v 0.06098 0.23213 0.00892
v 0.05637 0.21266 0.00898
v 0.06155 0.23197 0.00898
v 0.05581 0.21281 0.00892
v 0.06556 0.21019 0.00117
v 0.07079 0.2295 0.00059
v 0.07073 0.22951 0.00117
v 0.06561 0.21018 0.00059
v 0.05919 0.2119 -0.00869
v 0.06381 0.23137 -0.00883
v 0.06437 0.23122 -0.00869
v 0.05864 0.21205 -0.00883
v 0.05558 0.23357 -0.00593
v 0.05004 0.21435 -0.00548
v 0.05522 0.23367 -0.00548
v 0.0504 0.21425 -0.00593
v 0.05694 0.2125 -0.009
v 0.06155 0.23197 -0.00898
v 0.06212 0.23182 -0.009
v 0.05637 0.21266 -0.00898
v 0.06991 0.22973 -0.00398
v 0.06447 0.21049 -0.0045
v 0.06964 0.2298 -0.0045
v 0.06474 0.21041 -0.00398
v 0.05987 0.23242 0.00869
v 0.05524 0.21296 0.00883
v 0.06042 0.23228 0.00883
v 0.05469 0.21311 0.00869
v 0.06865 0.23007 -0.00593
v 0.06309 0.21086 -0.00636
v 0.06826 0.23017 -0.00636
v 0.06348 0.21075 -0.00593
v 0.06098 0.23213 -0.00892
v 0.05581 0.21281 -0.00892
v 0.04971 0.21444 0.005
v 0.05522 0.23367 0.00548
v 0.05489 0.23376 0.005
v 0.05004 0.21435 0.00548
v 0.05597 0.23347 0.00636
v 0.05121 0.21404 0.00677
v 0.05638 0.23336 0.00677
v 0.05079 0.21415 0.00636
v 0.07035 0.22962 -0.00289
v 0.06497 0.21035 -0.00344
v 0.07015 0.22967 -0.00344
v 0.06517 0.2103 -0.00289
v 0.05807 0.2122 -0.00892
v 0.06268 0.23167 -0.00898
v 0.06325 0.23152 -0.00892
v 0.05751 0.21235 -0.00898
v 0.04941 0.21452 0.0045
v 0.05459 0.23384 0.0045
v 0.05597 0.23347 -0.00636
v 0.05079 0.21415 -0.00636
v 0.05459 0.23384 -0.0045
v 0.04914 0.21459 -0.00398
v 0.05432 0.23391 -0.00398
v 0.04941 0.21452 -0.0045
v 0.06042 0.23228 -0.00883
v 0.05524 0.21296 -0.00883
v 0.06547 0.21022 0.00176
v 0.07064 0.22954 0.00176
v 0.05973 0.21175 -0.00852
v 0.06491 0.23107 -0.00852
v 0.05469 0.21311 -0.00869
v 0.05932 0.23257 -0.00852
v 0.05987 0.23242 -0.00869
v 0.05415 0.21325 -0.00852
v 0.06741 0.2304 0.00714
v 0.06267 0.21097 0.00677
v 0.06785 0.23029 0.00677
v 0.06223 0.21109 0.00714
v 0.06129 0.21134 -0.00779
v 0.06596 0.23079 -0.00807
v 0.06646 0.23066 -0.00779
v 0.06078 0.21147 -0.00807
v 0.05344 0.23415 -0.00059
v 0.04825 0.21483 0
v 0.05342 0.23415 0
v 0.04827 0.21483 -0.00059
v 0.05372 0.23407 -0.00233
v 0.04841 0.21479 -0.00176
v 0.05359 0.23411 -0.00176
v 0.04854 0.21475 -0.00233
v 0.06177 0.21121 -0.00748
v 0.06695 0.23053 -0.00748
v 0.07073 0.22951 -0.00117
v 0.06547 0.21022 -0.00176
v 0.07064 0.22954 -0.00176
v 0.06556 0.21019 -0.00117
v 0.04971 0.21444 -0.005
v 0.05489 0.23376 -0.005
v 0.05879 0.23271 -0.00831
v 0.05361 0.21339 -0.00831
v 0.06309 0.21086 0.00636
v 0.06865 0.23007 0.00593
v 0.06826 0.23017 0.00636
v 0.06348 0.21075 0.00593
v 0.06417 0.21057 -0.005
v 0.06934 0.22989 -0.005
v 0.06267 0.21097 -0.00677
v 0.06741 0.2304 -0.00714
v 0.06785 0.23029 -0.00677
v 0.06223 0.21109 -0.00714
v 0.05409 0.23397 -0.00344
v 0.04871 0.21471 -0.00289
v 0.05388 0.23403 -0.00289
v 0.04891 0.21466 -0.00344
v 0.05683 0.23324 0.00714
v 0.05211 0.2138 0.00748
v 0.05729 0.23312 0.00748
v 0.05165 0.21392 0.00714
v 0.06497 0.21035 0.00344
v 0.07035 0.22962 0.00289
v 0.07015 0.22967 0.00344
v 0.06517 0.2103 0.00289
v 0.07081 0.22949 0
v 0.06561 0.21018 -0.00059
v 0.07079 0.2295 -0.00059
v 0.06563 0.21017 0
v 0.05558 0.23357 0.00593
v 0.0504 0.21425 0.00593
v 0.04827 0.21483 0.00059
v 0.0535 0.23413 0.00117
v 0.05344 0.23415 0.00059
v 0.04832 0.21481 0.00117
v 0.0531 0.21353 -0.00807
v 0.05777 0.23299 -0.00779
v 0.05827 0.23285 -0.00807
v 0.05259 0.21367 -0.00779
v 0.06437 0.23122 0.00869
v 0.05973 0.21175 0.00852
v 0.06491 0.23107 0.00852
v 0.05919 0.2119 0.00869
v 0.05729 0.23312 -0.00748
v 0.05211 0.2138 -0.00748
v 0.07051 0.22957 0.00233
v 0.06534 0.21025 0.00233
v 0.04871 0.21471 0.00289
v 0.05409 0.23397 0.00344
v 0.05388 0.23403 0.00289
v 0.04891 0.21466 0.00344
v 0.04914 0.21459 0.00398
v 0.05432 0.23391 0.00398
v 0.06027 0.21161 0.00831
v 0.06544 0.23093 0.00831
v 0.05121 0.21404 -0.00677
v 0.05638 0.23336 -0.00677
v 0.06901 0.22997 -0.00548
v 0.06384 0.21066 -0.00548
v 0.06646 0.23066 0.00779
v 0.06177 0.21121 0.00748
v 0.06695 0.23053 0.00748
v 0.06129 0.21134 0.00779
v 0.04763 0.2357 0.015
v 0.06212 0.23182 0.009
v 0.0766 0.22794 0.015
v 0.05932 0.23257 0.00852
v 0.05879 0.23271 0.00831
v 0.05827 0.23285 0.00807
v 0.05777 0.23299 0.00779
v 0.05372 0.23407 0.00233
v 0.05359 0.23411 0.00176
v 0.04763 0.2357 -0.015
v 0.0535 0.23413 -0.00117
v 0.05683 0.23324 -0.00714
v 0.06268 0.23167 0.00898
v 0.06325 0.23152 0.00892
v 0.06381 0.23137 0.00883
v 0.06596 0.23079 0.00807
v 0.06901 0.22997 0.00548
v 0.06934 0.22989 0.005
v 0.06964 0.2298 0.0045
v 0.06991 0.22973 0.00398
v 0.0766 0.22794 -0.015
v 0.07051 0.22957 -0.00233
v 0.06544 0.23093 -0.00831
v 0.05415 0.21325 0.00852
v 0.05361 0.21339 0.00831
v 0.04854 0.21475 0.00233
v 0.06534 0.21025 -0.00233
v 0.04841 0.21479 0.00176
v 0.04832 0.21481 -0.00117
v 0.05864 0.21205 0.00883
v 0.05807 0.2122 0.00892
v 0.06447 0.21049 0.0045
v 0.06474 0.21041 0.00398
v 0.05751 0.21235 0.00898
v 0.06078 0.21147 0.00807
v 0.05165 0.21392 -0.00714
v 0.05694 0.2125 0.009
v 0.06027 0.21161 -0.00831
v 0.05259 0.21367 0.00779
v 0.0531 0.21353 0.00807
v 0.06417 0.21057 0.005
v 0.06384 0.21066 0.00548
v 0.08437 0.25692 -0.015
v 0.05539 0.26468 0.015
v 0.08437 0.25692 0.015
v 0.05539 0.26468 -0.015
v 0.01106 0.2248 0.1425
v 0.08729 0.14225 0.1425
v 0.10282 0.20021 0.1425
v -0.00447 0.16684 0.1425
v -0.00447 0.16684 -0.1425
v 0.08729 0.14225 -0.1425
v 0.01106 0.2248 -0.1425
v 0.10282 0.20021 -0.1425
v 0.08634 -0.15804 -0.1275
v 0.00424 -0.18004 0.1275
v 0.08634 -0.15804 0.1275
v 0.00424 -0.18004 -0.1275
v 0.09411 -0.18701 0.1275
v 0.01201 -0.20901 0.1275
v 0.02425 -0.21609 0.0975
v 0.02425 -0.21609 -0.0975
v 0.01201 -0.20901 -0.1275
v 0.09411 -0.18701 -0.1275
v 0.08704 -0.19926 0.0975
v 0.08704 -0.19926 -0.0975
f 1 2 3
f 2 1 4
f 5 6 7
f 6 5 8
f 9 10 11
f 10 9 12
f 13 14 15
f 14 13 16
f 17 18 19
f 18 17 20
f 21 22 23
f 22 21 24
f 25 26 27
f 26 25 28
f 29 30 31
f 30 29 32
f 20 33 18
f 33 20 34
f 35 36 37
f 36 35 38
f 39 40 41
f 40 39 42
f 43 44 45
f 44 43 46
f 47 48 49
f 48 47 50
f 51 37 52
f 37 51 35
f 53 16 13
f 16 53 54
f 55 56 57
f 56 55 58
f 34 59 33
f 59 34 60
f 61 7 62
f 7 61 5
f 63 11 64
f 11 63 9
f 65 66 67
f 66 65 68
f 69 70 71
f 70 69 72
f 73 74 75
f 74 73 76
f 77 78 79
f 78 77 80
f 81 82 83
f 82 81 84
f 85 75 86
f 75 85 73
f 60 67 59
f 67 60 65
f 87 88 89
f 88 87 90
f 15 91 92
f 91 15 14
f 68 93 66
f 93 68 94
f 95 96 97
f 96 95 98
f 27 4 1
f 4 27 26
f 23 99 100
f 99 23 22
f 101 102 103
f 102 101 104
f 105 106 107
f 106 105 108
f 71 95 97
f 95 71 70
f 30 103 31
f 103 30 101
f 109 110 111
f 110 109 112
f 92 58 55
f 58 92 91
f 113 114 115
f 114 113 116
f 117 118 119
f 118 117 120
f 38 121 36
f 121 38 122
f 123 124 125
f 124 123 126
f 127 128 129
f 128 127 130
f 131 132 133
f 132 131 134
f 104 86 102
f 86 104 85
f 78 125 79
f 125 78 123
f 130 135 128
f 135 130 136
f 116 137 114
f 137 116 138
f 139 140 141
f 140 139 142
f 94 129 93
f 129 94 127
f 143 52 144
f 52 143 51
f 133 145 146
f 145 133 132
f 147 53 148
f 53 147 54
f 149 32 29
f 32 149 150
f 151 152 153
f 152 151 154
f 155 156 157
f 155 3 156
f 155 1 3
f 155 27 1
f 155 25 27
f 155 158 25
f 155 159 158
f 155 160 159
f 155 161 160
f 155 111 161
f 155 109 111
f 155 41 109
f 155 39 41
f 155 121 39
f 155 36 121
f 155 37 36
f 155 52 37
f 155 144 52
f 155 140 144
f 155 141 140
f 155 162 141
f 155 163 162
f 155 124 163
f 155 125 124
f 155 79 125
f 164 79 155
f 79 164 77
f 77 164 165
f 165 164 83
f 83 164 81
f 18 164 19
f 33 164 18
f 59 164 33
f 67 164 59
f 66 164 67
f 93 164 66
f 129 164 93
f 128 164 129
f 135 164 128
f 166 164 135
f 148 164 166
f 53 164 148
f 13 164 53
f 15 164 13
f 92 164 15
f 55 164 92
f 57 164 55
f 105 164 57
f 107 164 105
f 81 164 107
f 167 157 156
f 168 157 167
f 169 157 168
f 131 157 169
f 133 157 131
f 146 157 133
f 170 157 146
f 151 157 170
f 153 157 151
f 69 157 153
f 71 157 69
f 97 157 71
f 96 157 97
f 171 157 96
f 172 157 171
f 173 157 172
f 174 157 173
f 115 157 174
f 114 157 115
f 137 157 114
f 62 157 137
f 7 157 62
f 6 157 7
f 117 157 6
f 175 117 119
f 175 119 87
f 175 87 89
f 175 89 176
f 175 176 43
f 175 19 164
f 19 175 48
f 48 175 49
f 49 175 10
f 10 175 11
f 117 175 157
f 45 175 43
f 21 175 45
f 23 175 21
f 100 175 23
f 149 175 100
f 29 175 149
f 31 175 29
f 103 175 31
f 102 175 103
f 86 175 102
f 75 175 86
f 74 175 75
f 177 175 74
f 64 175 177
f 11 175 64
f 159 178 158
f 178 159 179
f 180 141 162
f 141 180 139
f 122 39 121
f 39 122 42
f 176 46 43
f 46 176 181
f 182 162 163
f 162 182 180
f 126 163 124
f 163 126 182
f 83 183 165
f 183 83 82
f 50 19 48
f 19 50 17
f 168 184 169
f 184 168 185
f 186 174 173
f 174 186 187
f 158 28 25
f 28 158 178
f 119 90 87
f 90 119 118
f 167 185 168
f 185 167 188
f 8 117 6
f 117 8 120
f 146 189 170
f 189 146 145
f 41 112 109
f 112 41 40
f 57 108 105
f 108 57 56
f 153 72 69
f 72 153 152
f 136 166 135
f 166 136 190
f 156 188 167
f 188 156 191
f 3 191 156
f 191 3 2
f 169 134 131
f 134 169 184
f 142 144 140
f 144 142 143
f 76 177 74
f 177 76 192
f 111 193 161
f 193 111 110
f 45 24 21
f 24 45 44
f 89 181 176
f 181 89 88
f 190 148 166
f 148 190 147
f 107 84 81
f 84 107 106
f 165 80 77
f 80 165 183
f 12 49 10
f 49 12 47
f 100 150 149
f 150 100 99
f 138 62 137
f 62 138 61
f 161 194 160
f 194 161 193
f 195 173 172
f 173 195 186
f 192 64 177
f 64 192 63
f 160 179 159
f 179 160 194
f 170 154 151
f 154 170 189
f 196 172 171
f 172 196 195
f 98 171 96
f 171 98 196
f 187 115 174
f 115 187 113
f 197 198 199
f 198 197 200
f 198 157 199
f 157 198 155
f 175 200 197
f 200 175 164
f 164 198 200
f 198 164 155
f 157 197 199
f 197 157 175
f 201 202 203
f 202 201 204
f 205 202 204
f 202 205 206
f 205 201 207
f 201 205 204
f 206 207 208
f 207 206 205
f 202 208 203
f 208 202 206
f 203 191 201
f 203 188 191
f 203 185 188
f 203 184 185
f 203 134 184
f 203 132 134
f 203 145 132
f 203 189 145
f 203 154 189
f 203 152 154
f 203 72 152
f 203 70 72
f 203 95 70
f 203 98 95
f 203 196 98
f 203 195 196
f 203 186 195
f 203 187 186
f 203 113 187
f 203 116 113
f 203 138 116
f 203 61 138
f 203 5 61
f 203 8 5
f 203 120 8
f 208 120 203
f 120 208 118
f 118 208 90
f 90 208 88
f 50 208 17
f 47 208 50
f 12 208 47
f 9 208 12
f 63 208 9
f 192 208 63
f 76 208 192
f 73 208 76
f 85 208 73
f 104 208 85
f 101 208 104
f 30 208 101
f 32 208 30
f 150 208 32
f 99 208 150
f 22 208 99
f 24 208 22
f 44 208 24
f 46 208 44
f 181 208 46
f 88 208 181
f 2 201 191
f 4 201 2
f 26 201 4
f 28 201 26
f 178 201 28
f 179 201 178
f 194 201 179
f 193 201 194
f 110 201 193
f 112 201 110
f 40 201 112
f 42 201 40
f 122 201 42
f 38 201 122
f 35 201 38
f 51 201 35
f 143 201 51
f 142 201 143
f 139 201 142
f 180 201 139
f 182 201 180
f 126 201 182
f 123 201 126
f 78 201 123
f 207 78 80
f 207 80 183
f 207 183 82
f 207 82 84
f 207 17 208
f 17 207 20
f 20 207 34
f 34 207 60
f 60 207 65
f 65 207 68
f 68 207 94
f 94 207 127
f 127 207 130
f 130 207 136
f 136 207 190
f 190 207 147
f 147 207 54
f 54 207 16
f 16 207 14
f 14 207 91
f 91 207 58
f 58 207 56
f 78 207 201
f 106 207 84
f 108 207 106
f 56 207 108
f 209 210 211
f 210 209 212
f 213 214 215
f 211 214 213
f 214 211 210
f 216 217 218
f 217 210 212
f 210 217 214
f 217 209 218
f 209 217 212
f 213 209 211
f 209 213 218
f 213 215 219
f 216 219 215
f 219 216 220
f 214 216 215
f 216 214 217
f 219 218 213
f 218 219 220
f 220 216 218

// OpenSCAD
$fn=96;

L = 0.4;
W = 0.1;
H = 0.3;

module arc_rib(r_in, r_out, ang, h, center=true){
    rotate([0,0,-ang/2])
    rotate_extrude(angle=ang, convexity=10)
        translate([(r_in+r_out)/2,0,0])
            square([r_out-r_in, h], center=center);
}

module end_block(thick, w, h, x_pos){
    translate([x_pos,0,0])
        cube([thick,w,h], center=true);
}

module peg_tab(x_pos, peg_d, peg_len, tab_w, tab_h, tab_len){
    translate([x_pos,0,0]){
        translate([0,0,0])
            rotate([0,90,0])
                cylinder(d=peg_d, h=peg_len, center=true);
        translate([peg_len/2 + tab_len/2, 0, 0])
            cube([tab_len, tab_w, tab_h], center=true);
    }
}

module bracket(){
    ang = 150;
    r_out = 0.19;
    rib_t = 0.018;
    gap = 0.028;
    r_mid = r_out - rib_t - gap;
    r_in = r_mid - rib_t;

    rib_h = H;
    slot_h = H*0.78;

    union(){
        // Main curved ribs with tapered slot
        difference(){
            union(){
                arc_rib(r_out-rib_t, r_out, ang, rib_h, center=true);
                arc_rib(r_in, r_in+rib_t, ang, rib_h, center=true);
            }

            // Long tapered slot between ribs
            rotate([0,0,-ang/2])
            rotate_extrude(angle=ang, convexity=10)
                translate([r_in+rib_t + gap/2, 0, 0])
                    polygon(points=[
                        [-gap*0.65, -slot_h/2],
                        [ gap*0.65, -slot_h/2],
                        [ gap*0.35,  slot_h/2],
                        [-gap*0.35,  slot_h/2]
                    ]);

            // Open the "C" mouth a bit more
            rotate([0,0,ang/2])
                translate([0,0,0])
                    cube([0.5,0.5,0.5], center=true);
        }

        // End blocks: one thicker, one thinner/tapered
        x_thick = r_out*cos(ang/2);
        y_thick = r_out*sin(ang/2);

        x_thin  = r_out*cos(-ang/2);
        y_thin  = r_out*sin(-ang/2);

        // Thicker end block
        translate([x_thick, y_thick, 0])
            rotate([0,0,ang/2])
                end_block(0.06, W*0.95, H*0.95, 0);

        // Peg/tab on thicker end
        translate([x_thick, y_thick, 0])
            rotate([0,0,ang/2])
                translate([0.03, 0, 0])
                    peg_tab(0, 0.018, 0.04, 0.03, 0.03, 0.03);

        // Thinner tapered end block
        translate([x_thin, y_thin, 0])
            rotate([0,0,-ang/2])
                hull(){
                    end_block(0.03, W*0.85, H*0.85, 0);
                    translate([0.02,0,0])
                        end_block(0.01, W*0.65, H*0.65, 0);
                }
    }
}

bracket();
